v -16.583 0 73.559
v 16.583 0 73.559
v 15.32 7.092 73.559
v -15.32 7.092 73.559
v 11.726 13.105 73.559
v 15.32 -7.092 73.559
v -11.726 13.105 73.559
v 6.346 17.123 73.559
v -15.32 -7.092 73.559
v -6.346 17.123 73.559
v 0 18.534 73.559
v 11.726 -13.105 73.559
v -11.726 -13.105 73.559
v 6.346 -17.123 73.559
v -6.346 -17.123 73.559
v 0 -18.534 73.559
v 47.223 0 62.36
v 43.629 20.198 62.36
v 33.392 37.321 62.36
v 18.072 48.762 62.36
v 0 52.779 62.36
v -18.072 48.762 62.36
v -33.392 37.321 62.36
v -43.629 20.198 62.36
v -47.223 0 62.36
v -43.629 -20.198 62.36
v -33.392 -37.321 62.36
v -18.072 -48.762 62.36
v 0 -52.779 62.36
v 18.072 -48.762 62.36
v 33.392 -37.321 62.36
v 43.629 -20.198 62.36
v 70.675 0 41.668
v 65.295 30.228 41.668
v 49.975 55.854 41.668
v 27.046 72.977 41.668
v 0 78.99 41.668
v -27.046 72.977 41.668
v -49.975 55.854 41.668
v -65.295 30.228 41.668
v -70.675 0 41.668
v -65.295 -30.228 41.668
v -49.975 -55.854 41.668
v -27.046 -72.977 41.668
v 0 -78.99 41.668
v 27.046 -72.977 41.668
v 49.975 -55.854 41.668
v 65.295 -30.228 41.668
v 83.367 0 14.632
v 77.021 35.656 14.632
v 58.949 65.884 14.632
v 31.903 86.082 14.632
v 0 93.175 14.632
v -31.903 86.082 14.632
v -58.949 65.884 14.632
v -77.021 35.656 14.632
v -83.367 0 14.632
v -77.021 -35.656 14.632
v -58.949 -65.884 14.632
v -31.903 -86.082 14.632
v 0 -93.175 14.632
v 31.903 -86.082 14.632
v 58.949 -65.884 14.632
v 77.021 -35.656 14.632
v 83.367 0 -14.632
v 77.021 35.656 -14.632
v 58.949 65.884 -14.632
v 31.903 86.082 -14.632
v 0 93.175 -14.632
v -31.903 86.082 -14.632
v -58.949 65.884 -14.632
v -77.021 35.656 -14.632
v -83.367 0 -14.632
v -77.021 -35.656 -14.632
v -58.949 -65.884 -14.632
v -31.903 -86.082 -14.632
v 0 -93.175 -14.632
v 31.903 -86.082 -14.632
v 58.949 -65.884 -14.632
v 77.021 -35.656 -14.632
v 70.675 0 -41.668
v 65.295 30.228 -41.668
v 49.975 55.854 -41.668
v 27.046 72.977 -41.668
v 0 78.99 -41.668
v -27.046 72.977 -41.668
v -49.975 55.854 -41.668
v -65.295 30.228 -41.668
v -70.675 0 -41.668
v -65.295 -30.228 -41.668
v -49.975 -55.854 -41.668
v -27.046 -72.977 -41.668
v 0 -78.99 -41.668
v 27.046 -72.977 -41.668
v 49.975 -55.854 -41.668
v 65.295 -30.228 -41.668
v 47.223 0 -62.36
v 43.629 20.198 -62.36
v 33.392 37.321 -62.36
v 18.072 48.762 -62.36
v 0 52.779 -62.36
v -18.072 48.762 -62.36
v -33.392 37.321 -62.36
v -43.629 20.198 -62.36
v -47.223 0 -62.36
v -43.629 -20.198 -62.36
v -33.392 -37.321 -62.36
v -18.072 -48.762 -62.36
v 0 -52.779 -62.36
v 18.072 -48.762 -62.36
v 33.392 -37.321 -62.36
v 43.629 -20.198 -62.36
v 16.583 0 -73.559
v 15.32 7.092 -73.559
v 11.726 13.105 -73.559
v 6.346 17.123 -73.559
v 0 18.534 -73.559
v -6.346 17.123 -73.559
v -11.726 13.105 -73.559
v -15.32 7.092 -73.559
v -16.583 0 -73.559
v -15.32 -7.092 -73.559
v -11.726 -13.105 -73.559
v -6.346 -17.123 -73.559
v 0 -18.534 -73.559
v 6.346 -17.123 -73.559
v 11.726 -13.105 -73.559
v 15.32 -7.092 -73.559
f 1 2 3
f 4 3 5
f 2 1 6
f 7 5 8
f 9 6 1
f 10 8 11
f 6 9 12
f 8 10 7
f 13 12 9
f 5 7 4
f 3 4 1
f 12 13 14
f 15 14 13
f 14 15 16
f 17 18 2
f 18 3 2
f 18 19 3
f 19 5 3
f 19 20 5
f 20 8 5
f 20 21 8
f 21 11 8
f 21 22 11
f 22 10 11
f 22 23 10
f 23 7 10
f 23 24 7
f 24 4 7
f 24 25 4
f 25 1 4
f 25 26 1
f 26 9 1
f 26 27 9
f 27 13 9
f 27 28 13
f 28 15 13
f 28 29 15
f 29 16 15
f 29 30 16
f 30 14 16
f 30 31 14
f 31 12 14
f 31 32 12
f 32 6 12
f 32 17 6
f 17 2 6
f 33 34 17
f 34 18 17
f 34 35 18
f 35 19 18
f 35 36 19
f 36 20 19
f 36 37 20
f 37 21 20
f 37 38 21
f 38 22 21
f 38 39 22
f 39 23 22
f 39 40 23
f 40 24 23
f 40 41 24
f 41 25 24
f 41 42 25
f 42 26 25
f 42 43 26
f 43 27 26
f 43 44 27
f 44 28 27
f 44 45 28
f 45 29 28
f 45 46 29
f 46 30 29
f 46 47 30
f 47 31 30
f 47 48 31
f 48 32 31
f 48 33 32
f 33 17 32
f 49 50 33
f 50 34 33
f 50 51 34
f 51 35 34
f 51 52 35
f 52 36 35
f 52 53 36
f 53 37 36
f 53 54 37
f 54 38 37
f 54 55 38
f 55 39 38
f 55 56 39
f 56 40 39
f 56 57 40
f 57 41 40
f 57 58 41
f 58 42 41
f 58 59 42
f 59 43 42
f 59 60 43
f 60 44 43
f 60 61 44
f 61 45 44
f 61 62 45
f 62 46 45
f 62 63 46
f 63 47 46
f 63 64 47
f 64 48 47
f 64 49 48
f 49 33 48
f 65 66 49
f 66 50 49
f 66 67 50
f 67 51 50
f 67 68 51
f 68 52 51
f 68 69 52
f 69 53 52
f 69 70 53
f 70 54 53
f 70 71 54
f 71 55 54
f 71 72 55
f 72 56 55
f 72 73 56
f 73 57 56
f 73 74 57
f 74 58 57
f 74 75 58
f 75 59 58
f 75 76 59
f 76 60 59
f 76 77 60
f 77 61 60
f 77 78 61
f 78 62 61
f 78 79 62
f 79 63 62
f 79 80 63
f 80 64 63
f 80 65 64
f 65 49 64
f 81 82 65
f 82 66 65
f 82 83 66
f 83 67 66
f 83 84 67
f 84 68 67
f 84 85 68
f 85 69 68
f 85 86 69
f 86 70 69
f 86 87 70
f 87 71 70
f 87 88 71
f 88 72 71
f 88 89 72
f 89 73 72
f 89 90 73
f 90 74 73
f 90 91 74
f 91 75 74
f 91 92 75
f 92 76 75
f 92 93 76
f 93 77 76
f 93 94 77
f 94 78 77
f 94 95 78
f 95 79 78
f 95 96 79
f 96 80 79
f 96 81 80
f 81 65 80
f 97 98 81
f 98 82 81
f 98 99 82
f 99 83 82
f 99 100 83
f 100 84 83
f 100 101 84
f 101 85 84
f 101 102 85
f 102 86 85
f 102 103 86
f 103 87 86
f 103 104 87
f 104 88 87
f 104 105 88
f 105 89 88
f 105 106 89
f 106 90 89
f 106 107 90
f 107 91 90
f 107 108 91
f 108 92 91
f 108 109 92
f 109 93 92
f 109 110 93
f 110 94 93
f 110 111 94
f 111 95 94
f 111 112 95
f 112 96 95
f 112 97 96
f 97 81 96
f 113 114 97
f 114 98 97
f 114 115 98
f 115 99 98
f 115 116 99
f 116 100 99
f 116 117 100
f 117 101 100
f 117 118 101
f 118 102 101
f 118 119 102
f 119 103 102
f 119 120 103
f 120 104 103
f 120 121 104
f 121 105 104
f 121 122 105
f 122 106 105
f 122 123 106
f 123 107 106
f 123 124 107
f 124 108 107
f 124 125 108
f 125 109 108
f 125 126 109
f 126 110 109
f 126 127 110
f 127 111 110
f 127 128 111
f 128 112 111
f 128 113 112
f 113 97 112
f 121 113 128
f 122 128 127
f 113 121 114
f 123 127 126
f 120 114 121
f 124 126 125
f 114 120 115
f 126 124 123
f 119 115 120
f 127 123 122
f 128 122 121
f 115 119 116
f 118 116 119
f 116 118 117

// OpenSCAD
// Generated by SolidPython 1.0.1 on 2020-07-29 00:46:53


scale(v = [17, 19, 15]) {
	sphere(r = 5);
}
/***********************************************
*********      SolidPython code:      **********
************************************************
 
# import packages: SolidPython
from solid import *
from solid.utils import *
from itertools import chain, combinations, permutations


class Resize:

    def __init__(self, scad_file):
        self.scad_file = scad_file
        #self.scad_file = import_scad(scad_file)
        # cone/cylinder param:
        self.r1 = 0
        self.r2 = 0
        self.h = 0
        # rectangular prism param:
        self.w = 0
        self.l = 0
        # ellipse param:
        self.r = 0

    # import OpenScad code (file name corresponds to shape)


    # classify shape + parameters
    def assign(self, param1, param2, param3):
        if self.scad_file == 'cone.scad':
            self.r1 = param1
            self.r2 = param2
            self.h = param3
        elif self.scad_file == 'cylinder.scad':
            self.r1 = param1
            self.r2 = param2
            self.h = param3
        elif self.scad_file == 'rectangularPrism.scad':
            self.h = param1
            self.l = param2
            self.w = param3
        else:
            self.r = param1
            self.h = param2

    # resize parameters
    def iterate(self):
        x = range(3, 20, 2)
        i = 1
        if self.scad_file == 'cone.scad':
            tempList = list(permutations(x, 2))
            for temp in tempList:
                param1 = temp[0]
                param2 = temp[1]
                filepath = 'produced_scad_files/' + 'cone' + str(param1) + '_' + str(param2) + '_' + '.scad'
                scad_render_to_file(cylinder(h=param1, r1=param2, r2=0), filepath)

        elif self.scad_file == 'cylinder.scad':
            tempList = list(permutations(x, 3))
            for temp in tempList:
                param1 = temp[0]
                param2 = temp[1]
                filepath = 'produced_scad_files/' + 'cylinder' + str(param1) + '_' + str(param2) + '_' + '.scad'
                scad_render_to_file(cylinder(h=param1, r1=param2, r2=param2), filepath)

        elif self.scad_file == 'rectangularPrism.scad':
            tempList = list(permutations(x, 3))
            for temp in tempList:
                param1 = temp[0]
                param2 = temp[1]
                param3 = temp[2]
                filepath = 'produced_scad_files/' + 'rectangularPrism' + str(param1) + '_' + str(param2) + '_' + str(
                    param3) + '.scad'
                scad_render_to_file(cube(size=(param1, param2, param3)), filepath)

        elif self.scad_file == 'ellipse.scad':
            tempList = list(permutations(x, 4))
            for temp in tempList:
                param1 = temp[0]
                param2 = temp[1]
                param3 = temp[2]
                param4 = temp[3]
                filepath = 'produced_scad_files/' + 'ellipse' + str(param1) + '_' + str(param2) + '_' + str(param3) + '_' + str(param4) + '.scad'
                scad_render_to_file(scale([param1, param2, param3])(sphere(r=param4)), filepath)

    def render_to_scadfile(self):
        scad_render_to_file(scad, 'example.scad') 
 
************************************************/
